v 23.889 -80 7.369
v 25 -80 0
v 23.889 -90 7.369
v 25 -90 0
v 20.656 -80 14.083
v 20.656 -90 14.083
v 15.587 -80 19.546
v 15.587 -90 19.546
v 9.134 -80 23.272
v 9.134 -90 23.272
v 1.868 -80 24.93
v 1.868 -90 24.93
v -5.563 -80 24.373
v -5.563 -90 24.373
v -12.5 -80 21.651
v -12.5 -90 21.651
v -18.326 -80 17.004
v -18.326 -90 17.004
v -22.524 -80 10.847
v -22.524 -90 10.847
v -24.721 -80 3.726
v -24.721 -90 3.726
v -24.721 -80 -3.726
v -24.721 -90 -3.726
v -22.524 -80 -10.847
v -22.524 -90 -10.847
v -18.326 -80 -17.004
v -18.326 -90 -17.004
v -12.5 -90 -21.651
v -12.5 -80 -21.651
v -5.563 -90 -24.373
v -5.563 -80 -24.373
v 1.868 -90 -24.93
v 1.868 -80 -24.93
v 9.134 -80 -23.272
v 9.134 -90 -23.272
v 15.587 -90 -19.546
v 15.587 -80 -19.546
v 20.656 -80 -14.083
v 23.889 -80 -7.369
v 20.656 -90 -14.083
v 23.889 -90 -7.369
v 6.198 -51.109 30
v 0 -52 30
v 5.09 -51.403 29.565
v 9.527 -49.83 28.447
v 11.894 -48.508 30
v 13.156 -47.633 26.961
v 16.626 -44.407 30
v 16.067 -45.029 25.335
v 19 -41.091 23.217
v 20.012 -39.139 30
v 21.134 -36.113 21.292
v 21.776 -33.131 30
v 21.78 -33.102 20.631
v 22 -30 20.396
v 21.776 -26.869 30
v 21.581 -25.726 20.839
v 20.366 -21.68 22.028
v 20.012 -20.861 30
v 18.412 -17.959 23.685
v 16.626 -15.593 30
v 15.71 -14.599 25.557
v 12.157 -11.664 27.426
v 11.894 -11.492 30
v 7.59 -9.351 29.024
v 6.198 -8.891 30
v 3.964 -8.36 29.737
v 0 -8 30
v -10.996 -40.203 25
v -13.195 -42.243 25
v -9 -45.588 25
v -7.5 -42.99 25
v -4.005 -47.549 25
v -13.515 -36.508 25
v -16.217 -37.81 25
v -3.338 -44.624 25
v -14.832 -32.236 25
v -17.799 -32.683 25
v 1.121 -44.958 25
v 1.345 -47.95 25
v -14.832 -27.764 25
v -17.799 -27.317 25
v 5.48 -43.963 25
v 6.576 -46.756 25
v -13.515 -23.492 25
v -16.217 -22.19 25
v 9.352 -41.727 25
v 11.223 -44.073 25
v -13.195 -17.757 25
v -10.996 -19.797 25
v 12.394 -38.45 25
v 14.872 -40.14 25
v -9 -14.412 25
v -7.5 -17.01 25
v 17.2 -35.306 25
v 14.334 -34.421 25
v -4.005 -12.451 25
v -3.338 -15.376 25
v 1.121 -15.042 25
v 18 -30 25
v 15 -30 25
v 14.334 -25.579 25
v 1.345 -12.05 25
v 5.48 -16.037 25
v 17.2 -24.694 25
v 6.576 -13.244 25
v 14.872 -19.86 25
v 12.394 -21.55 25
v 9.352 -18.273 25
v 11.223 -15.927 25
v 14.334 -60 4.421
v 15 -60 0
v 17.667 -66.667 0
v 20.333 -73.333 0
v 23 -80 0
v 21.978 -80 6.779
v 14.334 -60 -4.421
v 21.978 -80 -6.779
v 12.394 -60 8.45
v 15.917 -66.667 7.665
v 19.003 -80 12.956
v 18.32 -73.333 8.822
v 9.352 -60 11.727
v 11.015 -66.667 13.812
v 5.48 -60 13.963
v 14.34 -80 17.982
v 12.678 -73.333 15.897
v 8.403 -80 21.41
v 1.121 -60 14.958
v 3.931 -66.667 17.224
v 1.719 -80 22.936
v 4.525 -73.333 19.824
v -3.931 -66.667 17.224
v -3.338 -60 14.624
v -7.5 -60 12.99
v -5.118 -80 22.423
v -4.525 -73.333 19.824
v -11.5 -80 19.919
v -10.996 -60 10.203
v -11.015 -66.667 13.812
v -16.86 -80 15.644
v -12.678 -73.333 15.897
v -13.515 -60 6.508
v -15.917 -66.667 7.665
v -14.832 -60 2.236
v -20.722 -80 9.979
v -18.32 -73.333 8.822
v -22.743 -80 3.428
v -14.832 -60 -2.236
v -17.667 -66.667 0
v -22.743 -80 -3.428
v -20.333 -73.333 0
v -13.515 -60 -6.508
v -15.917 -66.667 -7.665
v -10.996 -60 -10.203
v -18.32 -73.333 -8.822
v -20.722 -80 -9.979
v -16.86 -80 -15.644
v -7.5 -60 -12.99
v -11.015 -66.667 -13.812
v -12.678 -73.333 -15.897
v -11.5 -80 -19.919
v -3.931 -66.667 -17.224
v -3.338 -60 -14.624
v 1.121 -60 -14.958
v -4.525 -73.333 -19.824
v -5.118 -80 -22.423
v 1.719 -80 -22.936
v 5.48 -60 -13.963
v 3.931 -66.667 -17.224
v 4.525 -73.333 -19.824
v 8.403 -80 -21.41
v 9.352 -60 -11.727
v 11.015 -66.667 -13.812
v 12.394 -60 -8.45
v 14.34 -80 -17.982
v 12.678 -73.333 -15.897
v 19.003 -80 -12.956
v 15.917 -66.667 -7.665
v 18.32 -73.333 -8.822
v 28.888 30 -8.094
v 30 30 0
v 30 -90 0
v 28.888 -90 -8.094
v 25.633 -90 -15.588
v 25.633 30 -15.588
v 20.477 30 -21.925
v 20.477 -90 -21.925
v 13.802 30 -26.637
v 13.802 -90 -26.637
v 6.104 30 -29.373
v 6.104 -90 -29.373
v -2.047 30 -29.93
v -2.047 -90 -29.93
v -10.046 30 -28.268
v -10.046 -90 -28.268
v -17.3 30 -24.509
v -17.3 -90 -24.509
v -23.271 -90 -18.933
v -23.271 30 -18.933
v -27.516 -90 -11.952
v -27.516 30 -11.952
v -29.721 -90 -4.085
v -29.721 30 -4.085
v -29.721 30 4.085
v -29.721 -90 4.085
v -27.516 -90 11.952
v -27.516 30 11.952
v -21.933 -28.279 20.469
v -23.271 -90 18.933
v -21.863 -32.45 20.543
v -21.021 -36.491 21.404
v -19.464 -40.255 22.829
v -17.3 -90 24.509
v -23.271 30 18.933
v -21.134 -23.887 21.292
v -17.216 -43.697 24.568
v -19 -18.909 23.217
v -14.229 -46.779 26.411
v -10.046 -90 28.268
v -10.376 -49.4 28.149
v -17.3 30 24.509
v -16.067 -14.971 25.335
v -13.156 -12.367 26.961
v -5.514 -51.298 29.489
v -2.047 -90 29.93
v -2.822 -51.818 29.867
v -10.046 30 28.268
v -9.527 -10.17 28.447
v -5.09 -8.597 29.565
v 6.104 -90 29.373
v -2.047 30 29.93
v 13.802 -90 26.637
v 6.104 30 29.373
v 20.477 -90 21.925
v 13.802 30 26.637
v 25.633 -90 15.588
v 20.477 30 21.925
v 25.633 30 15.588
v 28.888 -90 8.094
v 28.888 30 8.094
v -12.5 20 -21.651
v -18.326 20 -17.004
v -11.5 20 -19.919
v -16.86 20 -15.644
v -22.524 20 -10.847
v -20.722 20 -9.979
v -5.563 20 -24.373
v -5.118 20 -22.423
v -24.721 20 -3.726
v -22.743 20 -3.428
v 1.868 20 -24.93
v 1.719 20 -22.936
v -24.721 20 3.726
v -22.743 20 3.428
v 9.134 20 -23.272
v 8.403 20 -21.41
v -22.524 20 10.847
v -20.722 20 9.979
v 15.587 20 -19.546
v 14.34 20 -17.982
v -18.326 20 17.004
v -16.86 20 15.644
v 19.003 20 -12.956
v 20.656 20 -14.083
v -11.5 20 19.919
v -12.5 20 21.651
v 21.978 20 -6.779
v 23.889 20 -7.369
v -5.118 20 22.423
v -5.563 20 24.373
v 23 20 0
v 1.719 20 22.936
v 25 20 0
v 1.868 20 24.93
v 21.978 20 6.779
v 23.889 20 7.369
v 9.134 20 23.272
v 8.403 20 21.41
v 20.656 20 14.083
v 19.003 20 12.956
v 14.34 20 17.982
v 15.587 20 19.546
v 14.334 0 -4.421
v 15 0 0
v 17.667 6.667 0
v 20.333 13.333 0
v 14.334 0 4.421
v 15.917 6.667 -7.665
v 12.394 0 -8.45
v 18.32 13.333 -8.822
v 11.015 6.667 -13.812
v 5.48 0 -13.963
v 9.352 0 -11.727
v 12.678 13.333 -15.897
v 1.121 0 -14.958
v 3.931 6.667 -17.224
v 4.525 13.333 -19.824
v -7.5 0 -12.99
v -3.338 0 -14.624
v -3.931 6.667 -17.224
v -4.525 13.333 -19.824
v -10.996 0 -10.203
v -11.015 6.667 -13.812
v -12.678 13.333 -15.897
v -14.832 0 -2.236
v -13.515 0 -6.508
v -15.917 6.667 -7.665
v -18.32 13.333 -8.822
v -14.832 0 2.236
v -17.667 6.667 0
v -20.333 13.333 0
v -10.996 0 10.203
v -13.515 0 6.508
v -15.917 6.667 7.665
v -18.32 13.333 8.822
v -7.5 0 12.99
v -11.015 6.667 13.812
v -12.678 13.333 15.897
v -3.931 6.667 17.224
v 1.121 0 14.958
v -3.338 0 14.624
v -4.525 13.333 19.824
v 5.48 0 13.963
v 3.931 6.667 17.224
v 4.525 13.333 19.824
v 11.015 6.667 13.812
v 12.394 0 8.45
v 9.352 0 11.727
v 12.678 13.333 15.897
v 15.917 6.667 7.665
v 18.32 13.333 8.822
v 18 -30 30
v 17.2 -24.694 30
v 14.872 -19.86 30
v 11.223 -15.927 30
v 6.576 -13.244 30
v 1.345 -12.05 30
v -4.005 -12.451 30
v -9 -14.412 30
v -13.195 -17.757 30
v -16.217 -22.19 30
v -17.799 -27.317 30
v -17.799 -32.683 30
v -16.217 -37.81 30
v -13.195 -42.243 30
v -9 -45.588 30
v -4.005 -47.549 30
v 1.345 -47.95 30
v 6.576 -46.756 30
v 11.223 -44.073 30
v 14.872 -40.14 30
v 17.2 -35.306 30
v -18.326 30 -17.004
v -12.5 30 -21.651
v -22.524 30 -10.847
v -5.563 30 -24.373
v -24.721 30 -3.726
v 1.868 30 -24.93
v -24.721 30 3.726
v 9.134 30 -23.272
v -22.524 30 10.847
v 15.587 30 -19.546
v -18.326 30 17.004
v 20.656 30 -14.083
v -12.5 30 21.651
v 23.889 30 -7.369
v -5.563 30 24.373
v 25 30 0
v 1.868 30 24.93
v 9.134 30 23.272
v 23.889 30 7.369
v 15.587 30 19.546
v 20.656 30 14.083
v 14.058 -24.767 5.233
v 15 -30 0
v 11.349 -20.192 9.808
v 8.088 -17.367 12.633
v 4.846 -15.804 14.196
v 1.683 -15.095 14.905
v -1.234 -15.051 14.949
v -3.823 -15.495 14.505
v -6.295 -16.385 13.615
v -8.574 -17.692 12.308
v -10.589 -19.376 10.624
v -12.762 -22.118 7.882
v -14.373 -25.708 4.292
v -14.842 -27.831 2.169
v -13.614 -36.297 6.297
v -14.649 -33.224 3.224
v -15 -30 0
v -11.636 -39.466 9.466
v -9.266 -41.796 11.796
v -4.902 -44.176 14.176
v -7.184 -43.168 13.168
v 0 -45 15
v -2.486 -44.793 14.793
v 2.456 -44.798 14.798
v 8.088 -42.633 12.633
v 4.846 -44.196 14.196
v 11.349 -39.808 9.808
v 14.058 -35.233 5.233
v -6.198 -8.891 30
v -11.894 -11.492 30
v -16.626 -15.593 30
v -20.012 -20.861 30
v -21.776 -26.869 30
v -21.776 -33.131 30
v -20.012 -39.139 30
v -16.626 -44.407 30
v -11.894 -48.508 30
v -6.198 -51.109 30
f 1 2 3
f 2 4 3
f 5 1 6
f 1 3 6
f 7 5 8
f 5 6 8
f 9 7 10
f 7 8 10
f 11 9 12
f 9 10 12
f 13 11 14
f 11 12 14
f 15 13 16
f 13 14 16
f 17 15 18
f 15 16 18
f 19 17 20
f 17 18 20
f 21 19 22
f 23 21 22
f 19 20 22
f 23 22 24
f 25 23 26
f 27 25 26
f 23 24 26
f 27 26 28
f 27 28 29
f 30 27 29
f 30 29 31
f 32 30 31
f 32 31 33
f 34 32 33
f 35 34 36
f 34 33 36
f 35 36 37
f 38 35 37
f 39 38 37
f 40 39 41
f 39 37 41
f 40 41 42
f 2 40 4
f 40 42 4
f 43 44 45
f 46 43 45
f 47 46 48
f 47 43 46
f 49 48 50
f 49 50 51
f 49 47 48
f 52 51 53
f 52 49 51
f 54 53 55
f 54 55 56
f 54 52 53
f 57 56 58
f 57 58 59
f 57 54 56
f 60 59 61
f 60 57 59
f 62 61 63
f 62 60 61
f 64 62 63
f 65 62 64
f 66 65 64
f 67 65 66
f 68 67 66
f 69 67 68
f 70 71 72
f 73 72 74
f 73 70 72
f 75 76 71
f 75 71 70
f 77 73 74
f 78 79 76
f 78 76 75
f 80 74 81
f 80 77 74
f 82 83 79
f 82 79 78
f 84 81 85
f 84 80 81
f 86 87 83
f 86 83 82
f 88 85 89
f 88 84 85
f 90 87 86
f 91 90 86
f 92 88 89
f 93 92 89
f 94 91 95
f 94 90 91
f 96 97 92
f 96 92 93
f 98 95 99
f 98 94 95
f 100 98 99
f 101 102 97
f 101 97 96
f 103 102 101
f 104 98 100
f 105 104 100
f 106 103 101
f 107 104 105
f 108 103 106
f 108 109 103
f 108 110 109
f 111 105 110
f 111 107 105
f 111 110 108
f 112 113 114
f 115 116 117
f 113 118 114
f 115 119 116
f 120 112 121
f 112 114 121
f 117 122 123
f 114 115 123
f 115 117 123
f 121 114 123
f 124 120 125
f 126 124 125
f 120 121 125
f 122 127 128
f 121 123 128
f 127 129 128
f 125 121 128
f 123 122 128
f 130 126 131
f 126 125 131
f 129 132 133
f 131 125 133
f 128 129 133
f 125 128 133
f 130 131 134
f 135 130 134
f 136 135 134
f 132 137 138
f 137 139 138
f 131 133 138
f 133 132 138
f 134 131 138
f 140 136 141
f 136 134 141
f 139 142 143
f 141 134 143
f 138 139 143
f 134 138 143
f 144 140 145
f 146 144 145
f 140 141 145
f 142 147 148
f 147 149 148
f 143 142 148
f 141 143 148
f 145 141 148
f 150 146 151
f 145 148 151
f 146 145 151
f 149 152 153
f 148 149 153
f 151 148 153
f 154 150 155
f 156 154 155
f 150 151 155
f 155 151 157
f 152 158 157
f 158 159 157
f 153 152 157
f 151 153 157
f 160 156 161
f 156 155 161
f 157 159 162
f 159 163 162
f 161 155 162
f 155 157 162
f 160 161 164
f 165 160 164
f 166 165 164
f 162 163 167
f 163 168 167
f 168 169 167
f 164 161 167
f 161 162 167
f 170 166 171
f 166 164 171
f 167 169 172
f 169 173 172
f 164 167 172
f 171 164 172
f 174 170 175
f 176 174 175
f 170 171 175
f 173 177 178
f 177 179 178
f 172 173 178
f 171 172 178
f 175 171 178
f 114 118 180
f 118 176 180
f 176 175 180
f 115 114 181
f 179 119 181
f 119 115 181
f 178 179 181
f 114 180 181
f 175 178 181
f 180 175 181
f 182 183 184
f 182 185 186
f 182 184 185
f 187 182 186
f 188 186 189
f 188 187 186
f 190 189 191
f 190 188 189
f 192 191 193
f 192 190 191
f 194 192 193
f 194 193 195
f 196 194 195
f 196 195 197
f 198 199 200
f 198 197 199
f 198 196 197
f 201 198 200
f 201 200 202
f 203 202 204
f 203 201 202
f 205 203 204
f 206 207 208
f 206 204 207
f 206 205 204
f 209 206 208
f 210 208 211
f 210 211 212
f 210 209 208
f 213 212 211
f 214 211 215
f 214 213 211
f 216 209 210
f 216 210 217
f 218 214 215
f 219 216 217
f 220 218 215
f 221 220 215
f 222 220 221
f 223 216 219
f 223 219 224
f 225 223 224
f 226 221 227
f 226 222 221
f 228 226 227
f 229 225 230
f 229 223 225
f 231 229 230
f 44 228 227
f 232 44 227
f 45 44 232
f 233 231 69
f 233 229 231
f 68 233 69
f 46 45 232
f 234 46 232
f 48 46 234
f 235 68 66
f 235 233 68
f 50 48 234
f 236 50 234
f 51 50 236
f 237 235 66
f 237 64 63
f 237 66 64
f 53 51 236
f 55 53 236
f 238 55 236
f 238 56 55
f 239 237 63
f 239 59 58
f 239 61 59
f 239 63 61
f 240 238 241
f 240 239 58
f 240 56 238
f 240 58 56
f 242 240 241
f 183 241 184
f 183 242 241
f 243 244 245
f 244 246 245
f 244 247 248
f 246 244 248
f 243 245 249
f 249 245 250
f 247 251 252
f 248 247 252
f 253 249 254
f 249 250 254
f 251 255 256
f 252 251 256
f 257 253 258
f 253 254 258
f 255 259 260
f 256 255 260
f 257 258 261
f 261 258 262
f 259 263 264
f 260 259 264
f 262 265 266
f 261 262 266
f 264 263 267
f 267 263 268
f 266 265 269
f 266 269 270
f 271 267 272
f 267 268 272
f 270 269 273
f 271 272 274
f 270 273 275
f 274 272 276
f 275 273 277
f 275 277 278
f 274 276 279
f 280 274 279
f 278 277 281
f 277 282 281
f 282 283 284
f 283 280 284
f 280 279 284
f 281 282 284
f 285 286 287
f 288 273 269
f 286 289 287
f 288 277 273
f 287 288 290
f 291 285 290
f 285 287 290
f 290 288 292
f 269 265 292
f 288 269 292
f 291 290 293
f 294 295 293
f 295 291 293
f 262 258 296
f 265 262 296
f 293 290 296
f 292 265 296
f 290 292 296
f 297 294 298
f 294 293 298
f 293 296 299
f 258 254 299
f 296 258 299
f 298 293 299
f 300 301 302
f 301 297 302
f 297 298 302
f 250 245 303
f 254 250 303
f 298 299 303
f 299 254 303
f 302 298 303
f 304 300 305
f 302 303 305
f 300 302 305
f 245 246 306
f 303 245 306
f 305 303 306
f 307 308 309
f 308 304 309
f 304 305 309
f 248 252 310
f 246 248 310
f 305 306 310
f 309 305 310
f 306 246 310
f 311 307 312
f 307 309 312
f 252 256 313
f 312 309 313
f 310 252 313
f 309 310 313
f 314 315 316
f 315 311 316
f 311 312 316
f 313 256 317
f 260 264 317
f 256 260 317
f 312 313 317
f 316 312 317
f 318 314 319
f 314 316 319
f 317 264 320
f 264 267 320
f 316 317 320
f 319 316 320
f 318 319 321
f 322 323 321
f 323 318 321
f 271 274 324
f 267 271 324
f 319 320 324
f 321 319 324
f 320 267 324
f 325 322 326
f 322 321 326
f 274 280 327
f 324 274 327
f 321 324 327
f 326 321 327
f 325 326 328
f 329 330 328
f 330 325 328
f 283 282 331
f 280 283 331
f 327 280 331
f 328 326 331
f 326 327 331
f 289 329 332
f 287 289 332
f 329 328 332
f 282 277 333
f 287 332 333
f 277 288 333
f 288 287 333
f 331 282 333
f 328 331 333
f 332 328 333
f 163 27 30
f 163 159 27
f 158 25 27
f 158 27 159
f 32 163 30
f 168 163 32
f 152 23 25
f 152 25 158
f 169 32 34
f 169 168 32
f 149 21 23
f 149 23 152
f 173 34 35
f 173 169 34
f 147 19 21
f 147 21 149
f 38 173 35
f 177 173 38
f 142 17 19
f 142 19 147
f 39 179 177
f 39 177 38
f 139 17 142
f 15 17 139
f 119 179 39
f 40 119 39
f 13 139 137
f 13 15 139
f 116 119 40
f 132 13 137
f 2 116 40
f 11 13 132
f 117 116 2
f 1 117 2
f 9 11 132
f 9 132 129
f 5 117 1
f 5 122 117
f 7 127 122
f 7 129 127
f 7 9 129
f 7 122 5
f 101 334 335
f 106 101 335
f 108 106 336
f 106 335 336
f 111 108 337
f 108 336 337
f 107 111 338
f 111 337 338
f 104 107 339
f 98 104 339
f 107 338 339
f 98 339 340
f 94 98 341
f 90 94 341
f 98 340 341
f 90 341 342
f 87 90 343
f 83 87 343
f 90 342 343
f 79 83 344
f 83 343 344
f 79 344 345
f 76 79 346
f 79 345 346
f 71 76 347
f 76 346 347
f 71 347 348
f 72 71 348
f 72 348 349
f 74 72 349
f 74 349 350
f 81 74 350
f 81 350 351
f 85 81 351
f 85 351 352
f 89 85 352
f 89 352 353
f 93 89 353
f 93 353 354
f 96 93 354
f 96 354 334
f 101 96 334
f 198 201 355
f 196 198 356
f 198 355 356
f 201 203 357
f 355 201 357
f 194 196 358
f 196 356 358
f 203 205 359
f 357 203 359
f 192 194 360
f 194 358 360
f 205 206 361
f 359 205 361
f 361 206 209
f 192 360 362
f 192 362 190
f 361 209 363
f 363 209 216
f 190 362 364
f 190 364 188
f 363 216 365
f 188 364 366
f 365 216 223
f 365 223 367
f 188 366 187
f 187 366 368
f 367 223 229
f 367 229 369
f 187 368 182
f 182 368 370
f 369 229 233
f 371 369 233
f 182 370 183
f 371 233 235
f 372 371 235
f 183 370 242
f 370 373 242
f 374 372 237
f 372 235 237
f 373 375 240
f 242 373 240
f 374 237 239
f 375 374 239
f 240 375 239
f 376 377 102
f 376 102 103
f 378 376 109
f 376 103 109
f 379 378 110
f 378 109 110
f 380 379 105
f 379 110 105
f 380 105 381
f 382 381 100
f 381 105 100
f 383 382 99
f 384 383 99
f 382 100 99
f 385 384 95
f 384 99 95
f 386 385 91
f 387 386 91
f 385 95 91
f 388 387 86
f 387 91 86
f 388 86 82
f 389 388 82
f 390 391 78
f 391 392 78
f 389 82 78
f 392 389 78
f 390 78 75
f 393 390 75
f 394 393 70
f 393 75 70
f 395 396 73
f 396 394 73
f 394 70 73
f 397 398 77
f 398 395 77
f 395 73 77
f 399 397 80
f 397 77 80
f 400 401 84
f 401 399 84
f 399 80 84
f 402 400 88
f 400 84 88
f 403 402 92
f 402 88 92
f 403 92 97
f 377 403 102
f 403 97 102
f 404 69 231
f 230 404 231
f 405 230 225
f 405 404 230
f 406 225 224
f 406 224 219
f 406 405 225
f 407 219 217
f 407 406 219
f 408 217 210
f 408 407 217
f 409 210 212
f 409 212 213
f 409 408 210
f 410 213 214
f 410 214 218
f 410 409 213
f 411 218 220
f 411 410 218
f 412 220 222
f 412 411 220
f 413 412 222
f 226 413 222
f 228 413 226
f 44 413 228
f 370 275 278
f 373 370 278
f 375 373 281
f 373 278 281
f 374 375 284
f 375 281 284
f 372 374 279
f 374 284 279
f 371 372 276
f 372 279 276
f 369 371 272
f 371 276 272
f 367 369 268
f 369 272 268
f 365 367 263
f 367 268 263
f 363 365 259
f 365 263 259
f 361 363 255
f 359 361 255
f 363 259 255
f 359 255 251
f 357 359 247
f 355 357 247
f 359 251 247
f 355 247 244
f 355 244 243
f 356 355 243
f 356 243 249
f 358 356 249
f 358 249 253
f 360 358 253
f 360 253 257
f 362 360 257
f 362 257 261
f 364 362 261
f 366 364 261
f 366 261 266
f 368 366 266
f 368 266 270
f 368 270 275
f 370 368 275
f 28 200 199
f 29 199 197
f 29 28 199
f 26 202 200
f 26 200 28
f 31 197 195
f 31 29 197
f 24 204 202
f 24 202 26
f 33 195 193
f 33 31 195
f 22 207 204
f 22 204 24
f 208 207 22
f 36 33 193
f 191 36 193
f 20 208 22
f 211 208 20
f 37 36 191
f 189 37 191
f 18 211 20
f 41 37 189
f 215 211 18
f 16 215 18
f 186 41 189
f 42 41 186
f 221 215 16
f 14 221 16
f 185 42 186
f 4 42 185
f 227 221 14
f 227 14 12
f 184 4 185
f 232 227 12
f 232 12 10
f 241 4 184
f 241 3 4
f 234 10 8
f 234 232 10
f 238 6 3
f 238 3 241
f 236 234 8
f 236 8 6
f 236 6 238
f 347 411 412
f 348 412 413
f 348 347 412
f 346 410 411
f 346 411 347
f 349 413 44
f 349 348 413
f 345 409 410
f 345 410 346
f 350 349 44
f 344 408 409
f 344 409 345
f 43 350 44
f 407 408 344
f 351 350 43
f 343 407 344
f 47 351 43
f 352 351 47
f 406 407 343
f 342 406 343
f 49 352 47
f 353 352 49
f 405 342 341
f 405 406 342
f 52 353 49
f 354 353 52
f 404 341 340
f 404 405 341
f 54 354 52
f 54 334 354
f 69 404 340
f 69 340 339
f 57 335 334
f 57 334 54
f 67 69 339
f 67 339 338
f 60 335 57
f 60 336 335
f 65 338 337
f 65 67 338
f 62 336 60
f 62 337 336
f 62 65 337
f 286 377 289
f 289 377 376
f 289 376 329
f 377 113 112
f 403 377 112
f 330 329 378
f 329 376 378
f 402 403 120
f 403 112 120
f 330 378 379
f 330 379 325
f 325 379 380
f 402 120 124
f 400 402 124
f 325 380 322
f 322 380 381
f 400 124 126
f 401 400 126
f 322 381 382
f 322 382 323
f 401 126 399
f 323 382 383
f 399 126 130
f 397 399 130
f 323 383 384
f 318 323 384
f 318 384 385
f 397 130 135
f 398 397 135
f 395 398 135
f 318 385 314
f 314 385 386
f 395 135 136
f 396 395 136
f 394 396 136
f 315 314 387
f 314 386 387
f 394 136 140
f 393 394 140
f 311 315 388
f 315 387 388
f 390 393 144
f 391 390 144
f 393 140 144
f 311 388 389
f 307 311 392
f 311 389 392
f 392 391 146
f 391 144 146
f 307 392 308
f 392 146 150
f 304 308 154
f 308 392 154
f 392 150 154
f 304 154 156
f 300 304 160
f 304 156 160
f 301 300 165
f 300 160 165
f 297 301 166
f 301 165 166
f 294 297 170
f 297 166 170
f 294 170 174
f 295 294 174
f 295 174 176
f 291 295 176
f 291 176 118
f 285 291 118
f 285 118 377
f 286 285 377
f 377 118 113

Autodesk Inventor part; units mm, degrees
sketch "Esquisse2" plane through (0, 0, 0) normal (0, 0, 1) x (1, 0, 0)
  line L0 (0, 16.6667) -> (0, -18.8492)
  line L1 (0, 54) -> (0, -114) construction
  line L2 (30, 30) -> (25, 30)
  line L3 (25, 30) -> (25, 20)
  line L4 (25, 20) -> (23, 20)
  line L5 (23, 20) -> (15, 0)
  line L6 (15, 0) -> (15, -60)
  line L7 (15, -60) -> (23, -80)
  line L8 (23, -80) -> (25, -80)
  line L9 (25, -80) -> (25, -90)
  line L10 (25, -90) -> (30, -90)
  line L11 (30, -90) -> (30, 30)
  line L12 (-6, 0) -> (36, 0) construction
  dimension "d4" = 30
  dimension "d5" = 50
  dimension "d6" = 60
  dimension "d8" = 10
  dimension "d9" = 100
  dimension "d10" = 30
  dimension "d11" = 10
  dimension "d12" = 2
  dimension "d13" = 2
  dimension "d14" = 20
  dimension "d15" = 20
  dimension "d17" = 21.801
revolve "Révolution1" add sketch "Esquisse2" angle 360 about axis through (0, 16.6667, 0) along (0, -1, 0)
ref_plane "Plan de construction1" through (0, 0, 30) normal (0, 0, 1) x (1, 0, 0)
sketch "Esquisse3" plane through (0, 0, 30) normal (0, 0, 1) x (1, 0, 0)
  line L0 (-15, -60) -> (15, -60) construction
  line L1 (-15, 0) -> (-23, 20) construction
  line L2 (15, 0) -> (23, 20) construction
  line L3 (-32.34, 0) -> (32.34, 0) construction
  line L4 (-23, -80) -> (-15, -60) construction
  line L5 (23, -80) -> (15, -60) construction
  circle A0 centre (0, -30) radius 15
  line L6 (0, 40) -> (0, -100) construction
  line L7 (-15, -60) -> (-15, 0) construction
  line L8 (15, -60) -> (15, 0) construction
  point P0 (0, 0)
  dimension "d19" = 60
  dimension "d20" = 30
  dimension "d21" = 30
extrude "Extrusion1" cut sketch "Esquisse3" against normal blind 30
sketch "Esquisse4" plane through (0, 0, 30) normal (0, 0, 1) x (1, 0, 0)
  arc A0 (15, -30) -> (-15, -30) centre (0, -30) ccw construction
  arc A1 (-15, -30) -> (15, -30) centre (0, -30) ccw construction
  line L0 (-15, -60) -> (15, -60) construction
  line L1 (-15, 0) -> (15, 0) construction
  circle A2 centre (0, -30) radius 22
  circle A3 centre (0, -30) radius 15
  point P0 (0, 0)
  point P1 (0, -15)
  point P2 (0, -45)
  dimension "d24" = 44
extrude "Extrusion2" add sketch "Esquisse4" against normal blind 10
sketch "Esquisse6" plane through (0, 0, 30) normal (0, 0, 1) x (1, 0, 0)
  circle A0 centre (0, -30) radius 15 construction
  arc A1 (0, -8) -> (0, -52) centre (0, -30) ccw construction
  arc A2 (0, -52) -> (0, -8) centre (0, -30) ccw construction
  circle A3 centre (0, -30) radius 15
  circle A4 centre (0, -30) radius 18
  point P0 (0, 0)
  dimension "d27" = 36
extrude "Extrusion3" cut sketch "Esquisse6" against normal blind 5
properties part number "P007_CanonSupportRervoir"
